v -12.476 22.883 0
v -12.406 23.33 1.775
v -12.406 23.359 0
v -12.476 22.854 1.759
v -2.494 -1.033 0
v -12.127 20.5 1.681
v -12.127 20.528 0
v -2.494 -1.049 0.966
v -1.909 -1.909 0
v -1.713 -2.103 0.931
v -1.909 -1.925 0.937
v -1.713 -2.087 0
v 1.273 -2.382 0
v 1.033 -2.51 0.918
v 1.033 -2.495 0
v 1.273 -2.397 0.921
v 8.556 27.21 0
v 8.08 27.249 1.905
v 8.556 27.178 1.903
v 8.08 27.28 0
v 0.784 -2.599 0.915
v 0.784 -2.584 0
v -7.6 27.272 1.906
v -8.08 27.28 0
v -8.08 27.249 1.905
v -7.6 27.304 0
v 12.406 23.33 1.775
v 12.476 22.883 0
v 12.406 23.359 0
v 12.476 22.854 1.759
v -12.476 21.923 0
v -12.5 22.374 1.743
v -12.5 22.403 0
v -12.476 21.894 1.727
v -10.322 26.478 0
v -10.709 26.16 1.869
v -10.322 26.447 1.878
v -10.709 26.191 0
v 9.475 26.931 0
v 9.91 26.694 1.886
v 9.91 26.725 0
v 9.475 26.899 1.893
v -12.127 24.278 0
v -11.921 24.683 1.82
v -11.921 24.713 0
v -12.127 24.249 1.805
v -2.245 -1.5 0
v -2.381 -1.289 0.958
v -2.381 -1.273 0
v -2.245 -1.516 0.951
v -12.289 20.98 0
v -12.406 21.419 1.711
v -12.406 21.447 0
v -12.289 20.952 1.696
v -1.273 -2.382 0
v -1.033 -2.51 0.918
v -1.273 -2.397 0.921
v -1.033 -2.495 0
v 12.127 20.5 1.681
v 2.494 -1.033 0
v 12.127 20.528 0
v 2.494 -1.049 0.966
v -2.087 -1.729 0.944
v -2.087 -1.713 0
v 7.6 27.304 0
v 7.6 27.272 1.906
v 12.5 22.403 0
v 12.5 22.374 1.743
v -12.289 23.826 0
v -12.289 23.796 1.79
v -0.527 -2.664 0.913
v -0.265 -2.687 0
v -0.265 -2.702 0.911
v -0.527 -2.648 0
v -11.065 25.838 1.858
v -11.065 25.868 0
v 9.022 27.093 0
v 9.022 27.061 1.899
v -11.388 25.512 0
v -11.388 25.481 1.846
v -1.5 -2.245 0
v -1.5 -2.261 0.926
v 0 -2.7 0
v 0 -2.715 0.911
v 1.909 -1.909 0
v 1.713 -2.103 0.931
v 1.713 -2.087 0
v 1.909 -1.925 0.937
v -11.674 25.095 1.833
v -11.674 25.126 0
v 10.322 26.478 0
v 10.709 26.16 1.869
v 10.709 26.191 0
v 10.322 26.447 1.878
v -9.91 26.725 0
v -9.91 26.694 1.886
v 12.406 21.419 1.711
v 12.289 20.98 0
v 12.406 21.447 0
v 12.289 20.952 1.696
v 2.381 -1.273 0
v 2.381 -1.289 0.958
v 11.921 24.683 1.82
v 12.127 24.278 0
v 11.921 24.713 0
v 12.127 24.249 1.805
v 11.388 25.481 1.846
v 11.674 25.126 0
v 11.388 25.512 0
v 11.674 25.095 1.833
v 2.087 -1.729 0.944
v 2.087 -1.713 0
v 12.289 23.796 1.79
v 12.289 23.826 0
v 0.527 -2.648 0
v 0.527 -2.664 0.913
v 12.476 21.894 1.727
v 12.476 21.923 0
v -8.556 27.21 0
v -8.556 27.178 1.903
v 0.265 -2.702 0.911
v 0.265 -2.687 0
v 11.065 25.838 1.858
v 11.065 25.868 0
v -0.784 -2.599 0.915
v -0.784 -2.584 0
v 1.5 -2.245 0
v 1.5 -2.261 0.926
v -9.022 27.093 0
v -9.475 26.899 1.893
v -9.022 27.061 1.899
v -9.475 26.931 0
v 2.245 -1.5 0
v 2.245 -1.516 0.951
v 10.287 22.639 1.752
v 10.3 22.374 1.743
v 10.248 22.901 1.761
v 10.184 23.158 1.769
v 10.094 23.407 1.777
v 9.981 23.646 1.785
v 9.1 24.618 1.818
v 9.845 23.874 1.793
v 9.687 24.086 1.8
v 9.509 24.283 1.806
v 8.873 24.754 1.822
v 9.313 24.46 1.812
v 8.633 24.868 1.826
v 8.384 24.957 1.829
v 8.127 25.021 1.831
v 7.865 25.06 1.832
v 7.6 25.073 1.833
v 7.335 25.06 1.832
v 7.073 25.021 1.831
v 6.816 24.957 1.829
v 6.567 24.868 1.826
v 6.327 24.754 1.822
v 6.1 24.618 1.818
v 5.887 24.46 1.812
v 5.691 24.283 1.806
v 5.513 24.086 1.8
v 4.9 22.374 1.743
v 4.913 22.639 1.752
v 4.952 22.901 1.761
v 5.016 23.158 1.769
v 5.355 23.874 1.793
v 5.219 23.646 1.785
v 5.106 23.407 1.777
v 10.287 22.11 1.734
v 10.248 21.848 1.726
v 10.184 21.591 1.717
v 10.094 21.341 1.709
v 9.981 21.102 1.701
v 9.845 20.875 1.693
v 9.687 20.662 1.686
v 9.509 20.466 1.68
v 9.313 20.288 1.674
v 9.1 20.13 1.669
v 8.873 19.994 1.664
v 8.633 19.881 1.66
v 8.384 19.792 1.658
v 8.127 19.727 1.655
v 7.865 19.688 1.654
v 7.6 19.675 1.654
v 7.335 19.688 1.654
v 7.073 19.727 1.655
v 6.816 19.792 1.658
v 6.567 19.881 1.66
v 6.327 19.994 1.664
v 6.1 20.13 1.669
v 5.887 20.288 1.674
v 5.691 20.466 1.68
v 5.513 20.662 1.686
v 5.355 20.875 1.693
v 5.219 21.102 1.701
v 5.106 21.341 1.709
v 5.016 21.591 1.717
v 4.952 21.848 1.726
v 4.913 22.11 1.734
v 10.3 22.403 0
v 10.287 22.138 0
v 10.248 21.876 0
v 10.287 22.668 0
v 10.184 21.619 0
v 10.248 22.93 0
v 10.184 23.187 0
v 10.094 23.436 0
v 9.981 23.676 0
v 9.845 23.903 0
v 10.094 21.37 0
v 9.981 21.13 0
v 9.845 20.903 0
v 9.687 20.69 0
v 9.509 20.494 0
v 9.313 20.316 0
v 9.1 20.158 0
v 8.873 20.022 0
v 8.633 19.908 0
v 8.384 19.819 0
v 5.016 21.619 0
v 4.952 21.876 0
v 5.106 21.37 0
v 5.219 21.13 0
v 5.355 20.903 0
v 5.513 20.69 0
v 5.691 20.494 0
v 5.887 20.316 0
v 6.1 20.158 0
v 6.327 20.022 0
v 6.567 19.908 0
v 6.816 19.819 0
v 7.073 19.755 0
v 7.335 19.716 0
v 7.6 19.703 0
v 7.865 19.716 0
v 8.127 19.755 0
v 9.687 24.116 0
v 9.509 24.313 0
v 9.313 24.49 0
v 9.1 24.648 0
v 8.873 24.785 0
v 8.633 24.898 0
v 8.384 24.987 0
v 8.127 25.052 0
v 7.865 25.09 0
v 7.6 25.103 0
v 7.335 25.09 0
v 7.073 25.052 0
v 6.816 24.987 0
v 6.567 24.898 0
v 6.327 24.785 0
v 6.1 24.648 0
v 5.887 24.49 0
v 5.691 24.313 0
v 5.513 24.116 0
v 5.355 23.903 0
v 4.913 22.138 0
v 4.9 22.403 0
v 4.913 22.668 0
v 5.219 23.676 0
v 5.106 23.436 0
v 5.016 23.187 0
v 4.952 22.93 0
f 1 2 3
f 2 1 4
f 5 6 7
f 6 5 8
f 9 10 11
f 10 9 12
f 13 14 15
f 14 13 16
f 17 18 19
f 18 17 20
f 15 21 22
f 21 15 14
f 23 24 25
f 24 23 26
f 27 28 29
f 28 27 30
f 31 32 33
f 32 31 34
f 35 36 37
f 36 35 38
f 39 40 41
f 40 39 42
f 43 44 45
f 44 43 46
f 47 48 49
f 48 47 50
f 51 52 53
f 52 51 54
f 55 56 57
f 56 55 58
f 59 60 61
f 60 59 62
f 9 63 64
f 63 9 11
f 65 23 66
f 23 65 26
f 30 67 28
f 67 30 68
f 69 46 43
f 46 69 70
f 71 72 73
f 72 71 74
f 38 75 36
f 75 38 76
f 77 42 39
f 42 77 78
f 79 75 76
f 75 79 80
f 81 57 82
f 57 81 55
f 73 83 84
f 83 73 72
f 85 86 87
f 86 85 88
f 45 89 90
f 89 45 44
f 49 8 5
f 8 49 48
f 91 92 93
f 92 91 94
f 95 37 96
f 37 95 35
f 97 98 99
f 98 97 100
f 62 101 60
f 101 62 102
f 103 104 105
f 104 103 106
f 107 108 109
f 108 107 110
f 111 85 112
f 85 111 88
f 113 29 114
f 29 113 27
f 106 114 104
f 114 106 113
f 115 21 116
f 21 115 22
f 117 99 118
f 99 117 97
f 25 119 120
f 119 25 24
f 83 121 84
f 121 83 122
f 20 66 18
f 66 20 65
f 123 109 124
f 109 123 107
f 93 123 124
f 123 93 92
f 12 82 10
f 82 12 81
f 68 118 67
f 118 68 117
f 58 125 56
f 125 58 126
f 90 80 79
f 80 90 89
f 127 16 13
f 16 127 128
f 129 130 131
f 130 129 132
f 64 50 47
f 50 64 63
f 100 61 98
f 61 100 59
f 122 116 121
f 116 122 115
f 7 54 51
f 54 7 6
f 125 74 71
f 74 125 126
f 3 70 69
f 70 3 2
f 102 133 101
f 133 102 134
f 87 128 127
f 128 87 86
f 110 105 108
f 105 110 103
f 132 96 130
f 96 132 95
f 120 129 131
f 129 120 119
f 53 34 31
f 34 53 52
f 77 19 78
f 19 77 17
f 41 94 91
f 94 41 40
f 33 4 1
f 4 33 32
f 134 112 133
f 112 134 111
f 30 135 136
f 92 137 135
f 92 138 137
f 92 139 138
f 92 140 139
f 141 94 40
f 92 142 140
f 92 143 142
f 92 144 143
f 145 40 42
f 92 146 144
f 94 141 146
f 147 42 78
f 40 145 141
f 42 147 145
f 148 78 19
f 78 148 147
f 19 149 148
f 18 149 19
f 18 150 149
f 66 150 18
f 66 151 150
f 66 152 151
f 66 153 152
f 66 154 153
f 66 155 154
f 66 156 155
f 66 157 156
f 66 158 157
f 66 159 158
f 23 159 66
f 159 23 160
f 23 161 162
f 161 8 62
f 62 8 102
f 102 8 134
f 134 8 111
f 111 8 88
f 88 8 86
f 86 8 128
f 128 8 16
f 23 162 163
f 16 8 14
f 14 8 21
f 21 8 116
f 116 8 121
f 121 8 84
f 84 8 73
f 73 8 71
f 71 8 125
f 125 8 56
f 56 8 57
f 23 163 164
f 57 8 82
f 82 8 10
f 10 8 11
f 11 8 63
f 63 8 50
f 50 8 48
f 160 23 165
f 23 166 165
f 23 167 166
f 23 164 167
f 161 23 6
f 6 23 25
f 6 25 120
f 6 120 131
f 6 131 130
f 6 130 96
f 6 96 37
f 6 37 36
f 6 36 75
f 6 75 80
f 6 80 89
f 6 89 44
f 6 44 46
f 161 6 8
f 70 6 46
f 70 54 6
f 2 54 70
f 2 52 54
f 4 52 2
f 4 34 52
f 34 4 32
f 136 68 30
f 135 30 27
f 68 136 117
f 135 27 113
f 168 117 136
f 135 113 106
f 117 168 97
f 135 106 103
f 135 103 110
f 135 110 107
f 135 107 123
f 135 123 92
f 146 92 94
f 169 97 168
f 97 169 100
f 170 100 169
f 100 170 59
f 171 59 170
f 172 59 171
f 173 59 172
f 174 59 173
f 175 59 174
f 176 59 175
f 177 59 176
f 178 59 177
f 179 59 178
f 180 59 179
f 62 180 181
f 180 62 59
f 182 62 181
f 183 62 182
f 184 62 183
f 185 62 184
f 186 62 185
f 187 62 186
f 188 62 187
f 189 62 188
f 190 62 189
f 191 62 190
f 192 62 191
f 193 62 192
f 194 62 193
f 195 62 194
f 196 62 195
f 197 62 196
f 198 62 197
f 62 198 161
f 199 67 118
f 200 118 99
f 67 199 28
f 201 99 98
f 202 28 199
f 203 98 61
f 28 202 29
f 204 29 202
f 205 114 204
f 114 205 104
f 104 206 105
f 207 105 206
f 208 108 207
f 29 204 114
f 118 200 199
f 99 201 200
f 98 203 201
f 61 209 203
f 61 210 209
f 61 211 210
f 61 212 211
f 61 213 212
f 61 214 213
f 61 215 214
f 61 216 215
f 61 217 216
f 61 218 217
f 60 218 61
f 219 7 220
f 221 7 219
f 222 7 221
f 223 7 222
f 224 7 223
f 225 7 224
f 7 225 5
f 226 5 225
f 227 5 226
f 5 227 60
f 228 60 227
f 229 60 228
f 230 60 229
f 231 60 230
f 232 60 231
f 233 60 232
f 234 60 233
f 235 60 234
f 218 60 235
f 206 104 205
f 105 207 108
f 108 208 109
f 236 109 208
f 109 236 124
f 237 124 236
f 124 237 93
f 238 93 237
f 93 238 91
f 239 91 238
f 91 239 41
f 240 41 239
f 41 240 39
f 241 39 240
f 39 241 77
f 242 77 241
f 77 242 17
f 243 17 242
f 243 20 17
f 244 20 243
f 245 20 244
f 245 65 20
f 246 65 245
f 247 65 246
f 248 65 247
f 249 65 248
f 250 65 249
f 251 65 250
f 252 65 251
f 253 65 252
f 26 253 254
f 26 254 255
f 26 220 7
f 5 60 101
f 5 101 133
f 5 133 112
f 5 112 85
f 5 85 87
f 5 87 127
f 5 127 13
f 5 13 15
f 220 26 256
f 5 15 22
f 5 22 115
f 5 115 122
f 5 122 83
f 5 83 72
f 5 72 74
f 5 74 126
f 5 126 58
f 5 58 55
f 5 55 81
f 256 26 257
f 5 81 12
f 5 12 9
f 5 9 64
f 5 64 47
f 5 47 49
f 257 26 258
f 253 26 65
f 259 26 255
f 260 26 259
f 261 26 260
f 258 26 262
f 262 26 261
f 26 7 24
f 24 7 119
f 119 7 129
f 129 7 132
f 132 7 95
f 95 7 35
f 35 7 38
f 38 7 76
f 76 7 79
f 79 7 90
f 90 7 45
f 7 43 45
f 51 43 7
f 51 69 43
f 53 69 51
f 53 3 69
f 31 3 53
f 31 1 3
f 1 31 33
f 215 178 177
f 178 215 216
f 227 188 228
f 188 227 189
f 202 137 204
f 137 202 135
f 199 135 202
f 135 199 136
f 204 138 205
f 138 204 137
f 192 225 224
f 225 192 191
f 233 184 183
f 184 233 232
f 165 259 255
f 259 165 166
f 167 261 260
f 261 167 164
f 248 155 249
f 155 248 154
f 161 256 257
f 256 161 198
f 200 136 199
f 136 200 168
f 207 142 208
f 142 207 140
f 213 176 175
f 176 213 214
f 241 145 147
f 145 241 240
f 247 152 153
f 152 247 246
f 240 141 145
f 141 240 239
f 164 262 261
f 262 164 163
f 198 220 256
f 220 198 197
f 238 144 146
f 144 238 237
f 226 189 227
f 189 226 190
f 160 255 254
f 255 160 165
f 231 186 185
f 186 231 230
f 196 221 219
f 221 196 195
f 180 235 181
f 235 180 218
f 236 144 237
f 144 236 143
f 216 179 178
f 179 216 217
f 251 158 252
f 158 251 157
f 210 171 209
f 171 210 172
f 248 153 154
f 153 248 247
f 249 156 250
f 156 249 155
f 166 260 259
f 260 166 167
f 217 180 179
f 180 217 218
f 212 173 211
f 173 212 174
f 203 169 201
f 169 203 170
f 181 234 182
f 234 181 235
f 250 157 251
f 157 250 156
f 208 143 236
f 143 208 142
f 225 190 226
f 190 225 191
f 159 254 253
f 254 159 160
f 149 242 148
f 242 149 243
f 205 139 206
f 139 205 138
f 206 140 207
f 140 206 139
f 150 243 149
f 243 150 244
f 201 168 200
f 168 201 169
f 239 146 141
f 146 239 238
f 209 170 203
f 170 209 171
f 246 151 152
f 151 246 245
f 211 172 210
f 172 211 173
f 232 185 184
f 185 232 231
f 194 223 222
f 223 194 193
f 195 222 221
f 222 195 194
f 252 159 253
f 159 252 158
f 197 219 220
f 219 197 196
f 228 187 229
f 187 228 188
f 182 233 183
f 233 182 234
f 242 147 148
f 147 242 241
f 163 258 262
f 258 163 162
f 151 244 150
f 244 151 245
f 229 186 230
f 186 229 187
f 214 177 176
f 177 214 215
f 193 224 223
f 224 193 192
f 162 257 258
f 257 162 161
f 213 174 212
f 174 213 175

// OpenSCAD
// customizable plectrum

tip_radius=2.7;
hip_radius=4.9;
width=25;
length=30;
bevel=.95;
tip_height=1;
hole="yes"; //[yes,no]
hole_radius=2.7;
resolution=64;

height=7;
// actual height of final object is determined by tip height and bevel angle.  
// if height variable is too low, there will be flats at the thick parts, 
// and the final object will not sit flat on the build platform.

$fn=resolution;

//place flat at origin
rotate ([bevel, 0, 0])
translate ([0, 0, tip_height/2-height/2])

difference(){
hull (){
cylinder (r=tip_radius, h=height);
translate ([-width/2+hip_radius, length-hip_radius-tip_radius, 0])
 cylinder (r=hip_radius, h=height);
translate ([width/2-hip_radius, length-hip_radius-tip_radius,0])
 cylinder (r=hip_radius, h=height);
 }

//cut top and bottom faces
rotate ([bevel, 0, 0])
 translate ([-width/2-1, -tip_radius-1, height/2+tip_height/2])
  cube ([width+2, length+2, height/2]);
rotate ([-bevel, 0, 0])
 translate ([-width/2-1, -tip_radius-1, -tip_height/2])
  cube ([width+2, length+2, height/2]);

//optional hole
if (hole=="yes"){
translate ([width/2-hip_radius, length-hip_radius-tip_radius, 0])
 cylinder (r=hole_radius, h=height);}
}
